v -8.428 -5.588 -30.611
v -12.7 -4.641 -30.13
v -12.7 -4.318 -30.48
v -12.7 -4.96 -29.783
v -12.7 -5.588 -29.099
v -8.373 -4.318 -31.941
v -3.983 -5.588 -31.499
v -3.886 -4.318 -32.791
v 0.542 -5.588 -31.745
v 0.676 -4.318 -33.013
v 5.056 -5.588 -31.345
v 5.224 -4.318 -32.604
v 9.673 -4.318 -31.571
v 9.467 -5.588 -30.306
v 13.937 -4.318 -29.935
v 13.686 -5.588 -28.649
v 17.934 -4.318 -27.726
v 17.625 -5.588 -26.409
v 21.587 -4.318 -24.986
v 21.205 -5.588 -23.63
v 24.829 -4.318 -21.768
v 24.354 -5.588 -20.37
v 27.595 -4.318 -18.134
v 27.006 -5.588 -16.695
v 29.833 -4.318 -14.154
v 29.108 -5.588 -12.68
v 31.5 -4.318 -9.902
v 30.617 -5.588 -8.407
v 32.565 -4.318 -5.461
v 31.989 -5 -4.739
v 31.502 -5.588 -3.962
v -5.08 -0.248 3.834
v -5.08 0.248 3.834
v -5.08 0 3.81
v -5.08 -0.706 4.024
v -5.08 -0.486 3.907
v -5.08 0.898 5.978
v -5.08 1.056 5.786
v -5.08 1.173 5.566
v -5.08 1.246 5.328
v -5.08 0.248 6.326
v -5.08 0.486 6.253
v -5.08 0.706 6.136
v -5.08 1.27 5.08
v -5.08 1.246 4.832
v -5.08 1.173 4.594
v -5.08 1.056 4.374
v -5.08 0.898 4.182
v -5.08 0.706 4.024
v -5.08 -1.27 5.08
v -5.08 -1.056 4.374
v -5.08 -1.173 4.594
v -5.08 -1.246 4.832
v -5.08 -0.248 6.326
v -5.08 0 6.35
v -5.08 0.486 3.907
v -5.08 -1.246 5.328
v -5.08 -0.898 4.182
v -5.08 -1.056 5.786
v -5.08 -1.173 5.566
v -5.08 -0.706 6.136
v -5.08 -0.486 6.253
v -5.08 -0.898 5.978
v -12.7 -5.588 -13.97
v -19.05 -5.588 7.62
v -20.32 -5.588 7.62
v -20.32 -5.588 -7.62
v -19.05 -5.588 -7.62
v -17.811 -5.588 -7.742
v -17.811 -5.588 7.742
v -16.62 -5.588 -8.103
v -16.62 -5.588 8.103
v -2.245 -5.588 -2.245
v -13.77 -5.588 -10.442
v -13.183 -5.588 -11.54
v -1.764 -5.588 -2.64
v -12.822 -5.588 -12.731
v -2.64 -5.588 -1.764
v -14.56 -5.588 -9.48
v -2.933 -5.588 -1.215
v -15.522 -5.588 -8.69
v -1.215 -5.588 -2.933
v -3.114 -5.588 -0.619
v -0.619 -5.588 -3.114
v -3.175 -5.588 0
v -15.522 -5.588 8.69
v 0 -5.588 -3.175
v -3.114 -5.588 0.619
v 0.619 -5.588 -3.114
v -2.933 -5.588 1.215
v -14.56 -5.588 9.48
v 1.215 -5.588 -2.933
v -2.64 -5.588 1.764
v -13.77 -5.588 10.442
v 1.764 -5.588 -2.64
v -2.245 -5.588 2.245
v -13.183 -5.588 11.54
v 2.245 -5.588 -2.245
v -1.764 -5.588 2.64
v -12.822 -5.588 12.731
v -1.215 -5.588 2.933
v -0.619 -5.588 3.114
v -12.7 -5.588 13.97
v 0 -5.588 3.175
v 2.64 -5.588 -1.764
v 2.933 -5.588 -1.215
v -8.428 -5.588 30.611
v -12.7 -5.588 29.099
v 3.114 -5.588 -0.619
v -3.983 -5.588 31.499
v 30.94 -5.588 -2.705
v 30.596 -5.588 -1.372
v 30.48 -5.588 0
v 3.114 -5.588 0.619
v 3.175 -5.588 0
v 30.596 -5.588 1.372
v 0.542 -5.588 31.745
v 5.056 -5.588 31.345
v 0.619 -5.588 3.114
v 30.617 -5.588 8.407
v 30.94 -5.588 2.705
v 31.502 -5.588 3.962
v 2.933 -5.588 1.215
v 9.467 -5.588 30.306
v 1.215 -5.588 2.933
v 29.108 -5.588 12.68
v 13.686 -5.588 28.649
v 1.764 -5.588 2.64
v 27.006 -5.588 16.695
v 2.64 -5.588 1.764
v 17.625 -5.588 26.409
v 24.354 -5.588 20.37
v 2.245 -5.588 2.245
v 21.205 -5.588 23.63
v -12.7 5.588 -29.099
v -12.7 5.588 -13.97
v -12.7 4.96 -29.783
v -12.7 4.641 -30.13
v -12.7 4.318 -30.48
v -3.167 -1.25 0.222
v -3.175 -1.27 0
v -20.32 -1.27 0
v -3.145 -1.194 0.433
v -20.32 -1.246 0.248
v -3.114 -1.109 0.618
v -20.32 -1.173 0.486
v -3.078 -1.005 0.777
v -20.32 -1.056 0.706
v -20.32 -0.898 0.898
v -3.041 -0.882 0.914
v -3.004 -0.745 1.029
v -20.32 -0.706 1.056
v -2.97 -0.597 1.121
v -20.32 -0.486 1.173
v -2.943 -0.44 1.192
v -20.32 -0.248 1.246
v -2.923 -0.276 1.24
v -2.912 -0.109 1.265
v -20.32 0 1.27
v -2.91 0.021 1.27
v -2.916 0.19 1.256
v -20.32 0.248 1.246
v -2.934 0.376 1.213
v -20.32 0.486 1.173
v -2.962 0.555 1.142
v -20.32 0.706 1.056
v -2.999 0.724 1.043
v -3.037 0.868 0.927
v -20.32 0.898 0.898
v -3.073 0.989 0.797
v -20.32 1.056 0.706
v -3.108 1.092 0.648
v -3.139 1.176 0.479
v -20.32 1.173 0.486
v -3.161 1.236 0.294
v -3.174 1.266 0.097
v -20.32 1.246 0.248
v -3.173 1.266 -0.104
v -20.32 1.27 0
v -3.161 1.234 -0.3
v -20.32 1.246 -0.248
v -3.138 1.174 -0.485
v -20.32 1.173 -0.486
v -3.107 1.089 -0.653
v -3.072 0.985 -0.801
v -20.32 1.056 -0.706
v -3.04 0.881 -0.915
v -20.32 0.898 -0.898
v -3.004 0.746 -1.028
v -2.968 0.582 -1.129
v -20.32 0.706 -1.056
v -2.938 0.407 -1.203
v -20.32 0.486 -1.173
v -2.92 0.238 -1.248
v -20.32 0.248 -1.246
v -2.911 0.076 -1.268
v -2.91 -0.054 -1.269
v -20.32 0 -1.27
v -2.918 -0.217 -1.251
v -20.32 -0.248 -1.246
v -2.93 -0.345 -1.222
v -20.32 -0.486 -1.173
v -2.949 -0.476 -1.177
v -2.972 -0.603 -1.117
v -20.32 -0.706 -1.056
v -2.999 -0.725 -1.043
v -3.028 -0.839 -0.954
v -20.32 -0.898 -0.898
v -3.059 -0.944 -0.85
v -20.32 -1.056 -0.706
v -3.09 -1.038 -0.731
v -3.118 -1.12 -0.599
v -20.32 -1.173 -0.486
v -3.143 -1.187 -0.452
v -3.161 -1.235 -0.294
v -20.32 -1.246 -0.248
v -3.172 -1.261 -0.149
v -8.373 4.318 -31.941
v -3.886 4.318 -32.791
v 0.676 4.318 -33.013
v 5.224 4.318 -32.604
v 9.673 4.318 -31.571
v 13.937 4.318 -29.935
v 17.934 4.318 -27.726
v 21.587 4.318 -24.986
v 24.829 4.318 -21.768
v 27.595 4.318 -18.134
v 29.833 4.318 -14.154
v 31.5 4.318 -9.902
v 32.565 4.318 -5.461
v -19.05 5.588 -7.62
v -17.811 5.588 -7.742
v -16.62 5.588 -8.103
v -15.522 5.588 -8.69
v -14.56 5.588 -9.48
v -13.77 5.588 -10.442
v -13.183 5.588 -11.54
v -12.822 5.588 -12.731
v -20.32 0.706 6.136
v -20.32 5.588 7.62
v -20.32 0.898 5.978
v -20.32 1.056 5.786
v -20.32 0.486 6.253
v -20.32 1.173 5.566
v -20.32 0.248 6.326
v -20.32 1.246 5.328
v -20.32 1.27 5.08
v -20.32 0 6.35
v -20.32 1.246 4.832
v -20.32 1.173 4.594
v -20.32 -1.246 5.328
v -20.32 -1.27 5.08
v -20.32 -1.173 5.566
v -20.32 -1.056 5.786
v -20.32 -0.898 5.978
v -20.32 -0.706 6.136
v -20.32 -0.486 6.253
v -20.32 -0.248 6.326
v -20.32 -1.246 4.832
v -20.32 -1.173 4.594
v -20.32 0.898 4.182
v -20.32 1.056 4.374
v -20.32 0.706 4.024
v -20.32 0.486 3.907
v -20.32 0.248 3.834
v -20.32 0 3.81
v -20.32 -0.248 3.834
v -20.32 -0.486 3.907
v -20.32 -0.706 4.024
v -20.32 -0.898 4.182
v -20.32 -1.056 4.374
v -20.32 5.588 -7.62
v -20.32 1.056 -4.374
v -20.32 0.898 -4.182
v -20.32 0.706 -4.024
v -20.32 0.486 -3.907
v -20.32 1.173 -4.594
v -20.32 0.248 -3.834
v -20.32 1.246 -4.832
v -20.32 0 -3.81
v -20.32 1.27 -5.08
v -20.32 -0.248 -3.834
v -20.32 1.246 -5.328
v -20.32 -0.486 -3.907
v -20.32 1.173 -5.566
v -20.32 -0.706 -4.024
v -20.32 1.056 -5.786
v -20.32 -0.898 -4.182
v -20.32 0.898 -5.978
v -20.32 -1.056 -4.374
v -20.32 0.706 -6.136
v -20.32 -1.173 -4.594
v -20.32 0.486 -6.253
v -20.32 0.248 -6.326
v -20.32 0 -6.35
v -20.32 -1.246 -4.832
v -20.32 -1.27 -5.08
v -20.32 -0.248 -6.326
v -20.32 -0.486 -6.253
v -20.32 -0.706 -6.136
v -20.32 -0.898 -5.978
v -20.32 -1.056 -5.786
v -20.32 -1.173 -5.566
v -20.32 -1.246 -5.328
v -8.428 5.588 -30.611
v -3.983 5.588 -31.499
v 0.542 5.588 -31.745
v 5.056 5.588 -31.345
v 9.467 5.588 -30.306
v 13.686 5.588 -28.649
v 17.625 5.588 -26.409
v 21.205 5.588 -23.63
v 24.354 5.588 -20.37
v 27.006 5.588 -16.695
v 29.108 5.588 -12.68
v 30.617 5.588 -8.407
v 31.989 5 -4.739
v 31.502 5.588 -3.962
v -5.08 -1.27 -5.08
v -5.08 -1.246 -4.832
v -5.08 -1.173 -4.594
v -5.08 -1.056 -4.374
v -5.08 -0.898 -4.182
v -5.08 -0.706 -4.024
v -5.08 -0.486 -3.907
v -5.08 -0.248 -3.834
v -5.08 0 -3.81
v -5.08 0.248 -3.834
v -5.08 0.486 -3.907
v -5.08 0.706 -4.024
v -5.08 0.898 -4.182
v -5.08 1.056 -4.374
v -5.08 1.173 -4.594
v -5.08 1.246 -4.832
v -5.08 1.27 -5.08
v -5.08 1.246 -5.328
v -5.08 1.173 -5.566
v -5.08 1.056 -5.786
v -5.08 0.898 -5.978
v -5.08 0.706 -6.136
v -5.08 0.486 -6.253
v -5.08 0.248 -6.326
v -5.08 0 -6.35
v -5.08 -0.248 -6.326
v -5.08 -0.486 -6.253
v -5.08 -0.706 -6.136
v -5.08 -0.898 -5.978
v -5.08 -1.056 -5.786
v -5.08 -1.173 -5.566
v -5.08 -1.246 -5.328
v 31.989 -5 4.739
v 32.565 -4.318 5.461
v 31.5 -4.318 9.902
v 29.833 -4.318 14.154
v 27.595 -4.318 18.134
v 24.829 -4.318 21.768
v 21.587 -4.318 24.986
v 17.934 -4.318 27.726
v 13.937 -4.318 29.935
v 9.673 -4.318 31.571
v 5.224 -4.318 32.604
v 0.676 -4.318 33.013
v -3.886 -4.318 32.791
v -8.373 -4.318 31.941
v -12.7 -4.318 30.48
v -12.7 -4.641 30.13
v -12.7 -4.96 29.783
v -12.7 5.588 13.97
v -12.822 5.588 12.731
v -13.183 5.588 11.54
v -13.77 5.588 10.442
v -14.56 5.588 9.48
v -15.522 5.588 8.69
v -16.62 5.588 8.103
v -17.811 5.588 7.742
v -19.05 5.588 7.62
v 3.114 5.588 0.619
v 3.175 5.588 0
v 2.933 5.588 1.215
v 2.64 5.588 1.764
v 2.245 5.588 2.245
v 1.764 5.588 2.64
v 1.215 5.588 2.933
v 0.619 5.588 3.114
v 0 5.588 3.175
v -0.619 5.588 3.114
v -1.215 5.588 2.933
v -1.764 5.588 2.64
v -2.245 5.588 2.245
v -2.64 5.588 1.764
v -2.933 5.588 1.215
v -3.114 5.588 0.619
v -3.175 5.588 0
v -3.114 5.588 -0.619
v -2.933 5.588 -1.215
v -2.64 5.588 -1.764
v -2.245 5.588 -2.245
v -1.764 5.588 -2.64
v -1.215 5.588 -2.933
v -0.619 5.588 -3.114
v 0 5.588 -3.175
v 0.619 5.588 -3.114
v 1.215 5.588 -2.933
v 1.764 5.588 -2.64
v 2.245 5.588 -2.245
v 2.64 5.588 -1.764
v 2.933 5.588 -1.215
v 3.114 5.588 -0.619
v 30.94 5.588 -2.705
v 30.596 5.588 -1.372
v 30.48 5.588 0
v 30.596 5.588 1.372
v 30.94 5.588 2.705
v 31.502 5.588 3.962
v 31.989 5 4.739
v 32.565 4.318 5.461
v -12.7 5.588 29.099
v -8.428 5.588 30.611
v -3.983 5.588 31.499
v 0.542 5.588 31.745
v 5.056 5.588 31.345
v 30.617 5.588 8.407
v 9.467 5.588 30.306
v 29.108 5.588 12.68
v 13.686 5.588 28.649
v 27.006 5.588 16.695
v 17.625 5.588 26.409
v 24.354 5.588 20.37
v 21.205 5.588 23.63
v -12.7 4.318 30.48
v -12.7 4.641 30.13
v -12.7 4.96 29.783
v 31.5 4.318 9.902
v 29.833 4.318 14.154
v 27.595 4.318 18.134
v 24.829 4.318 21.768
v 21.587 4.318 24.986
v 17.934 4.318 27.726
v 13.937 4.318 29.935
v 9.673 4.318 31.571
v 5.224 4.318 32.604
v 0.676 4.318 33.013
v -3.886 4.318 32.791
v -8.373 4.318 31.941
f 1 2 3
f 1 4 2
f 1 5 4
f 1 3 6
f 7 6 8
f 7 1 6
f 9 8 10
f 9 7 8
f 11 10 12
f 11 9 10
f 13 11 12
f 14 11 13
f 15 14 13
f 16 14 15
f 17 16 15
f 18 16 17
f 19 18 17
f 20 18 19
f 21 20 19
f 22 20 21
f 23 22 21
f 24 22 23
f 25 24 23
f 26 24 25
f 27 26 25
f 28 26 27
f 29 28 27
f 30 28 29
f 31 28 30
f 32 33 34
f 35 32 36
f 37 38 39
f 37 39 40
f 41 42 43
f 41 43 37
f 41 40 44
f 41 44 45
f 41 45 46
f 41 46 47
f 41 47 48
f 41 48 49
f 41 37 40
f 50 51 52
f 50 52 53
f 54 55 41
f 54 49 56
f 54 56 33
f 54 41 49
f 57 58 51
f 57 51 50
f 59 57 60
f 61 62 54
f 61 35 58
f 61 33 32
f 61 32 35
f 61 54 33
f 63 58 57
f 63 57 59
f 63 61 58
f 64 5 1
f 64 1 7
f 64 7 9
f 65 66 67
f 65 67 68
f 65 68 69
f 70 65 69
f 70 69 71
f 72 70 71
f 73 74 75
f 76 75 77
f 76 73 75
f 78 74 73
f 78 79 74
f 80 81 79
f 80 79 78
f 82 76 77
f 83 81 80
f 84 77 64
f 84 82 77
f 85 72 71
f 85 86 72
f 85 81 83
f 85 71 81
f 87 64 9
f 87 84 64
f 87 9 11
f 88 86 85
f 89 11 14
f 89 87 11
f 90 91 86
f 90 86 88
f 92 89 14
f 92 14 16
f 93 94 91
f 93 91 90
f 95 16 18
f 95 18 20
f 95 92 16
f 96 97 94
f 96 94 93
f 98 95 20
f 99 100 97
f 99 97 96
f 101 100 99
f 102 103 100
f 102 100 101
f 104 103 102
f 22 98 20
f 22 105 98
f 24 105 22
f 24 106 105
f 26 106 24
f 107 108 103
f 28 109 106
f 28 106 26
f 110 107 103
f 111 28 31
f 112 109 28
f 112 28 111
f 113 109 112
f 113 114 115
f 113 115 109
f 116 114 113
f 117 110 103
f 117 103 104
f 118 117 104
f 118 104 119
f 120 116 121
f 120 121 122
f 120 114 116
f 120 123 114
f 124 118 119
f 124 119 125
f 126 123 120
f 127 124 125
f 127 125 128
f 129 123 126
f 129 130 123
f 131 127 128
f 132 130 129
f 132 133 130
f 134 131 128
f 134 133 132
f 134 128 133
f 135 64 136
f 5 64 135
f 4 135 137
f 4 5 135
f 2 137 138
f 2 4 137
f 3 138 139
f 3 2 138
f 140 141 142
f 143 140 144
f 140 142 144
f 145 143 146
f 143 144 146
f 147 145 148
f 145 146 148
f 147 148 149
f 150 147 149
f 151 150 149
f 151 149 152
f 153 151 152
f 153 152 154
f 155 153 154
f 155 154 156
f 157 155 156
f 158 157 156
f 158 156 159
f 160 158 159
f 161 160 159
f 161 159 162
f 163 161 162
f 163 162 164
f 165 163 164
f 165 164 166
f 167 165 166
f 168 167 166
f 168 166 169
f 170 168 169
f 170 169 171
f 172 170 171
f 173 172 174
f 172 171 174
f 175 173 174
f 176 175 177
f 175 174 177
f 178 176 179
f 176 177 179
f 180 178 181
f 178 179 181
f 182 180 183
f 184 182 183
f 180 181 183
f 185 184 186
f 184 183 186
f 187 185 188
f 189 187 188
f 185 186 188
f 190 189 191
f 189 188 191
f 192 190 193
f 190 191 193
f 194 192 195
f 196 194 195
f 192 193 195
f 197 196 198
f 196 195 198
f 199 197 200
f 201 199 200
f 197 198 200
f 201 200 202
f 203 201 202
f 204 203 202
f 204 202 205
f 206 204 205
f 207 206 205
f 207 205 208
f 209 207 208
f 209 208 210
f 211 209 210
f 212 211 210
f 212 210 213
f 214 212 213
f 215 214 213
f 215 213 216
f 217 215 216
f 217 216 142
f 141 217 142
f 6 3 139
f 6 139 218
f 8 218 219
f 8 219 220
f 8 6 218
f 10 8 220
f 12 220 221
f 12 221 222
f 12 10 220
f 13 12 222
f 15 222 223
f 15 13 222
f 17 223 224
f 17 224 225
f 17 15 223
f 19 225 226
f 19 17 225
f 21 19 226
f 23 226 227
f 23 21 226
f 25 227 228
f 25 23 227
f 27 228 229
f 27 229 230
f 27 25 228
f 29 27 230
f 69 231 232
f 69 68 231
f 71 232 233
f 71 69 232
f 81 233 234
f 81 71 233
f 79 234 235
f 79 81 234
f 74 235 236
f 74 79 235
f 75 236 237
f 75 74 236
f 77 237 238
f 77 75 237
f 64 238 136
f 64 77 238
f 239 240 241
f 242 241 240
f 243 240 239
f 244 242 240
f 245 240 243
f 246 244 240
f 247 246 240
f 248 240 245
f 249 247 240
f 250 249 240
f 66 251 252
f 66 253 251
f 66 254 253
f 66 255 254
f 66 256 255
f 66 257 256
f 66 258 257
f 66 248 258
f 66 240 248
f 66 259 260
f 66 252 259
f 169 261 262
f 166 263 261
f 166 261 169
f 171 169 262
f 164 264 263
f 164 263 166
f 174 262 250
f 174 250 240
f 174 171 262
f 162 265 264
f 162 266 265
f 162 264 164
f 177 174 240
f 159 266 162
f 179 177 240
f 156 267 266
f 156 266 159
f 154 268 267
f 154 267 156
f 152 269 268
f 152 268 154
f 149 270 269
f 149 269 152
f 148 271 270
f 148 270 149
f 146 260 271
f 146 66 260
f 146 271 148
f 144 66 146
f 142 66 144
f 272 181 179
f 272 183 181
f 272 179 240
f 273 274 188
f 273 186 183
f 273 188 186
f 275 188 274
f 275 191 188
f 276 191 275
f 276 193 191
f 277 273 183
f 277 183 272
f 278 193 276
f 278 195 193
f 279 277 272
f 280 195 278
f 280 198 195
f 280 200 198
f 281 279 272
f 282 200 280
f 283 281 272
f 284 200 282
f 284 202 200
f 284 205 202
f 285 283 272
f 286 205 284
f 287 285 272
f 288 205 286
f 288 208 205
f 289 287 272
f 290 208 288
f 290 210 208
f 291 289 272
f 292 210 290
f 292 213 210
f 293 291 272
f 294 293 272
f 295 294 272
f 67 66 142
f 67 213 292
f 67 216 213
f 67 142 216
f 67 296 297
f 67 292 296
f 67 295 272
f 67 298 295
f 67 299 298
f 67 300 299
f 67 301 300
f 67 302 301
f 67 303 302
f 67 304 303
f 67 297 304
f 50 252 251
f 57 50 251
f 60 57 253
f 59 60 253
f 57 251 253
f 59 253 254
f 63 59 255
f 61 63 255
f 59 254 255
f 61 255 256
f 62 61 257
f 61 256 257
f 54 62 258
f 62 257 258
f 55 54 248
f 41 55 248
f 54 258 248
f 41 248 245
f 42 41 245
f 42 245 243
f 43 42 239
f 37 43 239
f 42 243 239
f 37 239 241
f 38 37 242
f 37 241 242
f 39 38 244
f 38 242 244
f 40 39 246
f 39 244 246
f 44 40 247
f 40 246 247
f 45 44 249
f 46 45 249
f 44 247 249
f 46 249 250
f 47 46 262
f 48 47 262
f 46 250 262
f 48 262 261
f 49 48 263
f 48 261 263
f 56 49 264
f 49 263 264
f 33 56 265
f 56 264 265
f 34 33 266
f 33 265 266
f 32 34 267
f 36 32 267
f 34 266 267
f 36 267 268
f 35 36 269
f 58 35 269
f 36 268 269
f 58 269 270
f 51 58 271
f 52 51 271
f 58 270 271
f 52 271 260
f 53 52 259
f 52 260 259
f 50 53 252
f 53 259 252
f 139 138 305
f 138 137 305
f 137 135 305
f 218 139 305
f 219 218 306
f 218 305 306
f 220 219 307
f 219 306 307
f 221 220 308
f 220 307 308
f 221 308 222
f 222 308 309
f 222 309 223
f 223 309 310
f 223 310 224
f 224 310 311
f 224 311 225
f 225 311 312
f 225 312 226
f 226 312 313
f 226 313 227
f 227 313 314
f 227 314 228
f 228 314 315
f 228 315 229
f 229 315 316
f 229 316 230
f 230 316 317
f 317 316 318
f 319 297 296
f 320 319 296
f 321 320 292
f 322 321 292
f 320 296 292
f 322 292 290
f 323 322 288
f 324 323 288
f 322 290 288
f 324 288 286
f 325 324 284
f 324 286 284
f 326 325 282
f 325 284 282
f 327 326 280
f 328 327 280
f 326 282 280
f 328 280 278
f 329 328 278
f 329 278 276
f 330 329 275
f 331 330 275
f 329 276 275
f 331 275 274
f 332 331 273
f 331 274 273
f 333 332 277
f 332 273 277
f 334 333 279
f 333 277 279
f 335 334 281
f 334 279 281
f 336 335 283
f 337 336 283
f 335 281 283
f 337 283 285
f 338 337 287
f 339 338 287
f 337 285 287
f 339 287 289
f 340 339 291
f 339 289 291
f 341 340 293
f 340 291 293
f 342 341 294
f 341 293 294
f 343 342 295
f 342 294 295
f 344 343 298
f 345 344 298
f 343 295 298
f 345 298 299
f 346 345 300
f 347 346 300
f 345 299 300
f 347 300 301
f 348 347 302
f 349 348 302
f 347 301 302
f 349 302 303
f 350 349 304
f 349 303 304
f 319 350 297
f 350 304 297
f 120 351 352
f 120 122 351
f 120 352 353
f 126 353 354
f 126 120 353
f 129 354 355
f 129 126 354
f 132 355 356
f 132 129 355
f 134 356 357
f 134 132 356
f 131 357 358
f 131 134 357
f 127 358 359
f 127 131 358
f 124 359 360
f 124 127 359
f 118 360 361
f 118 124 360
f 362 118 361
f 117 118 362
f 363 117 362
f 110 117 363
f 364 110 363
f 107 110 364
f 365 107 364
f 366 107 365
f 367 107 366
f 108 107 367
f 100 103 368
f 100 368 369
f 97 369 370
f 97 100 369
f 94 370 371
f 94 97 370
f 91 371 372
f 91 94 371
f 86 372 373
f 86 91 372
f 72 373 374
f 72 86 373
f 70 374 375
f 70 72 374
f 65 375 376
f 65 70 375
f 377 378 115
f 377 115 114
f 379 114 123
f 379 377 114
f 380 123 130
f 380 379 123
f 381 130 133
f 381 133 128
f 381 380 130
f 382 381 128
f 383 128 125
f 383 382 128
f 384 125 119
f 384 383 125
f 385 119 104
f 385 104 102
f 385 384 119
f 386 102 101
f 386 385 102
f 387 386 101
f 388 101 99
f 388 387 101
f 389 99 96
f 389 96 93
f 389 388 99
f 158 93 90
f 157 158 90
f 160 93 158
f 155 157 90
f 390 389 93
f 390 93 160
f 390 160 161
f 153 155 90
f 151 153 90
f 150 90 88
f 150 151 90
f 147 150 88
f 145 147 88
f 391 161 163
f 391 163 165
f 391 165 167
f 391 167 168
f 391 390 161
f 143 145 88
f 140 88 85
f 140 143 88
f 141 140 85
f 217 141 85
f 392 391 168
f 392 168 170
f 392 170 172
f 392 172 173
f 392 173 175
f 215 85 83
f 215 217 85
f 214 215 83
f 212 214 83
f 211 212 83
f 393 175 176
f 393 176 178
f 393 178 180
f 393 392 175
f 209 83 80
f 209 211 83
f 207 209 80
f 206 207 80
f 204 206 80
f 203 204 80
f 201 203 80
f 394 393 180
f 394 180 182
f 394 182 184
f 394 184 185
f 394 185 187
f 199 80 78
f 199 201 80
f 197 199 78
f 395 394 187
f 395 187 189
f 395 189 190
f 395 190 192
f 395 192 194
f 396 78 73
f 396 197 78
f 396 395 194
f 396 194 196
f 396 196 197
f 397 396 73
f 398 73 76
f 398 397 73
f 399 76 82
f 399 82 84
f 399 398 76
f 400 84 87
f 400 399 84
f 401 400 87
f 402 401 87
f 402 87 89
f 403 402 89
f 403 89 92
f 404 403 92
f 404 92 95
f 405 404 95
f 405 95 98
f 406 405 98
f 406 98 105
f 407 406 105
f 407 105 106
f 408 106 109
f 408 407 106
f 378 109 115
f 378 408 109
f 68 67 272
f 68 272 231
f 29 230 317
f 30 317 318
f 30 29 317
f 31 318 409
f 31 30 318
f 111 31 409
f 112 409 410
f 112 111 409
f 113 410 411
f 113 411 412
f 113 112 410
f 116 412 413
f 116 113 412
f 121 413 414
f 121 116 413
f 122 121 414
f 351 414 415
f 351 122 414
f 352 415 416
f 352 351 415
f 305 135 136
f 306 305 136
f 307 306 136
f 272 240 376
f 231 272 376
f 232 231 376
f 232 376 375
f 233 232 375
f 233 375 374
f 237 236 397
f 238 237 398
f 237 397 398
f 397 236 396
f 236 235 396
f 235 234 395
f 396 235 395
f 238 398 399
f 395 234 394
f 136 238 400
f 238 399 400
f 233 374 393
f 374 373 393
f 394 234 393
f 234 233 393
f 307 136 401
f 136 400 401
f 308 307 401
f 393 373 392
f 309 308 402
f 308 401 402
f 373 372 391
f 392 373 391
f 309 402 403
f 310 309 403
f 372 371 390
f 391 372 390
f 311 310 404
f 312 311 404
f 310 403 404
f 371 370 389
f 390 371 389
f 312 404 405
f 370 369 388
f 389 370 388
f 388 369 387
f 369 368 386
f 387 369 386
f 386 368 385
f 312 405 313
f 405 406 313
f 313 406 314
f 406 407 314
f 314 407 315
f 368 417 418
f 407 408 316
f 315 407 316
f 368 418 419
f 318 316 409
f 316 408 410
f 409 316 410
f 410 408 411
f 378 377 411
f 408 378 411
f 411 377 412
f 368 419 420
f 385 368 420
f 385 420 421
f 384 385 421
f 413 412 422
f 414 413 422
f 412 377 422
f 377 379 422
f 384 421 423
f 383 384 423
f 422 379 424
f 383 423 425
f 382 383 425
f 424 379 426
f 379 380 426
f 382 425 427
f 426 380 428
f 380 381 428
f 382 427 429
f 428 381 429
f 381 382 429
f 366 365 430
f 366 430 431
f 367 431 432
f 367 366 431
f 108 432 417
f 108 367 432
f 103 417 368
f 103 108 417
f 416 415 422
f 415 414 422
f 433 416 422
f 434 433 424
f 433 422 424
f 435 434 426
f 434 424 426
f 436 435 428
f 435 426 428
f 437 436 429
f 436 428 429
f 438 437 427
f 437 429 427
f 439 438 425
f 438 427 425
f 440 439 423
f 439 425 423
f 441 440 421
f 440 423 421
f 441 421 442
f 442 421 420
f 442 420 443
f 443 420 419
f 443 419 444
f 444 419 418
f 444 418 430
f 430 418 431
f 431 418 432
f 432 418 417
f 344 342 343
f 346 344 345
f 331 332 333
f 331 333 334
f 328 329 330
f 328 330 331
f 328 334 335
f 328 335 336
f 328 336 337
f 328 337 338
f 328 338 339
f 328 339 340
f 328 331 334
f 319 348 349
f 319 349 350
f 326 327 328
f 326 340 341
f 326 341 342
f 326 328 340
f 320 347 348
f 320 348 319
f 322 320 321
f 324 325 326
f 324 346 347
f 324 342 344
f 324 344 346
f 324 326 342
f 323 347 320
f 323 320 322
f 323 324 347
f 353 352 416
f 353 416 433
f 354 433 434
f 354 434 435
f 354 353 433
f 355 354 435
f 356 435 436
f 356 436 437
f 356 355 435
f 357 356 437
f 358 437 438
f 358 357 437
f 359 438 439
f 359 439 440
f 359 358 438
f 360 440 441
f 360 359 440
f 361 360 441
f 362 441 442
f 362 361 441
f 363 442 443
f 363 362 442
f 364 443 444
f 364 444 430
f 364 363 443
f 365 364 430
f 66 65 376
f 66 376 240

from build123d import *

# Parameters (mm, degrees)
F0_R     = 3.175
F1_DEPTH = 5.588
F2_R     = 1.27
F3_DEPTH = 15.24
F4_DEPTH = 19.05
F5_SIZE  = 1.27


with BuildPart() as f1:
    # F0 (on Front) → F1 (new body, symmetric)
    with BuildSketch(Plane.XZ):
        with BuildLine():
            ThreePointArc((32.5652864105, 5.461), (15.973258631, 28.8994015285), (-12.7, 30.48))
            Line((-12.7, 30.48), (-12.7, 13.97))
            ThreePointArc((-12.7, 13.97), (-14.5598719395, 9.4798719395), (-19.05, 7.62))
            Line((-19.05, 7.62), (-20.32, 7.62))
            Line((-20.32, 7.62), (-20.32, -7.62))
            Line((-20.32, -7.62), (-19.05, -7.62))
            ThreePointArc((-19.05, -7.62), (-14.5598719395, -9.4798719395), (-12.7, -13.97))
            Line((-12.7, -13.97), (-12.7, -30.48))
            ThreePointArc((-12.7, -30.48), (15.973258631, -28.8994015285), (32.5652864105, -5.461))
            ThreePointArc((32.5652864105, -5.461), (30.48, 0), (32.5652864105, 5.461))
        make_face()
        Circle(F0_R, mode=Mode.SUBTRACT)
    extrude(amount=F1_DEPTH, both=True)

    # F2 (on face) → F3 (cut)
    with BuildSketch(Plane(origin=(-20.32, 0, 0), x_dir=(0, -1, 0), z_dir=(-1, 0, 0))):
        Circle(F2_R)
        with Locations((0, 5.08)):
            Circle(F2_R)
        with Locations((0, -5.08)):
            Circle(F2_R)
    extrude(amount=-F3_DEPTH, mode=Mode.SUBTRACT)

    # F2 (on face) → F4 (cut)
    with BuildSketch(Plane(origin=(-20.32, 0, 0), x_dir=(0, -1, 0), z_dir=(-1, 0, 0))):
        Circle(F2_R)
    extrude(amount=-F4_DEPTH, mode=Mode.SUBTRACT)

    # F5
    f5_edges = [f1.edges().sort_by_distance(p)[0] for p in [
        (15.973259, -5.588, 28.899402),
        (15.973259, -5.588, -28.899402),
        (15.973259, 5.588, 28.899402),
        (15.973259, 5.588, -28.899402),
    ]]
    chamfer(f5_edges, length=F5_SIZE)


solid = f1.part
